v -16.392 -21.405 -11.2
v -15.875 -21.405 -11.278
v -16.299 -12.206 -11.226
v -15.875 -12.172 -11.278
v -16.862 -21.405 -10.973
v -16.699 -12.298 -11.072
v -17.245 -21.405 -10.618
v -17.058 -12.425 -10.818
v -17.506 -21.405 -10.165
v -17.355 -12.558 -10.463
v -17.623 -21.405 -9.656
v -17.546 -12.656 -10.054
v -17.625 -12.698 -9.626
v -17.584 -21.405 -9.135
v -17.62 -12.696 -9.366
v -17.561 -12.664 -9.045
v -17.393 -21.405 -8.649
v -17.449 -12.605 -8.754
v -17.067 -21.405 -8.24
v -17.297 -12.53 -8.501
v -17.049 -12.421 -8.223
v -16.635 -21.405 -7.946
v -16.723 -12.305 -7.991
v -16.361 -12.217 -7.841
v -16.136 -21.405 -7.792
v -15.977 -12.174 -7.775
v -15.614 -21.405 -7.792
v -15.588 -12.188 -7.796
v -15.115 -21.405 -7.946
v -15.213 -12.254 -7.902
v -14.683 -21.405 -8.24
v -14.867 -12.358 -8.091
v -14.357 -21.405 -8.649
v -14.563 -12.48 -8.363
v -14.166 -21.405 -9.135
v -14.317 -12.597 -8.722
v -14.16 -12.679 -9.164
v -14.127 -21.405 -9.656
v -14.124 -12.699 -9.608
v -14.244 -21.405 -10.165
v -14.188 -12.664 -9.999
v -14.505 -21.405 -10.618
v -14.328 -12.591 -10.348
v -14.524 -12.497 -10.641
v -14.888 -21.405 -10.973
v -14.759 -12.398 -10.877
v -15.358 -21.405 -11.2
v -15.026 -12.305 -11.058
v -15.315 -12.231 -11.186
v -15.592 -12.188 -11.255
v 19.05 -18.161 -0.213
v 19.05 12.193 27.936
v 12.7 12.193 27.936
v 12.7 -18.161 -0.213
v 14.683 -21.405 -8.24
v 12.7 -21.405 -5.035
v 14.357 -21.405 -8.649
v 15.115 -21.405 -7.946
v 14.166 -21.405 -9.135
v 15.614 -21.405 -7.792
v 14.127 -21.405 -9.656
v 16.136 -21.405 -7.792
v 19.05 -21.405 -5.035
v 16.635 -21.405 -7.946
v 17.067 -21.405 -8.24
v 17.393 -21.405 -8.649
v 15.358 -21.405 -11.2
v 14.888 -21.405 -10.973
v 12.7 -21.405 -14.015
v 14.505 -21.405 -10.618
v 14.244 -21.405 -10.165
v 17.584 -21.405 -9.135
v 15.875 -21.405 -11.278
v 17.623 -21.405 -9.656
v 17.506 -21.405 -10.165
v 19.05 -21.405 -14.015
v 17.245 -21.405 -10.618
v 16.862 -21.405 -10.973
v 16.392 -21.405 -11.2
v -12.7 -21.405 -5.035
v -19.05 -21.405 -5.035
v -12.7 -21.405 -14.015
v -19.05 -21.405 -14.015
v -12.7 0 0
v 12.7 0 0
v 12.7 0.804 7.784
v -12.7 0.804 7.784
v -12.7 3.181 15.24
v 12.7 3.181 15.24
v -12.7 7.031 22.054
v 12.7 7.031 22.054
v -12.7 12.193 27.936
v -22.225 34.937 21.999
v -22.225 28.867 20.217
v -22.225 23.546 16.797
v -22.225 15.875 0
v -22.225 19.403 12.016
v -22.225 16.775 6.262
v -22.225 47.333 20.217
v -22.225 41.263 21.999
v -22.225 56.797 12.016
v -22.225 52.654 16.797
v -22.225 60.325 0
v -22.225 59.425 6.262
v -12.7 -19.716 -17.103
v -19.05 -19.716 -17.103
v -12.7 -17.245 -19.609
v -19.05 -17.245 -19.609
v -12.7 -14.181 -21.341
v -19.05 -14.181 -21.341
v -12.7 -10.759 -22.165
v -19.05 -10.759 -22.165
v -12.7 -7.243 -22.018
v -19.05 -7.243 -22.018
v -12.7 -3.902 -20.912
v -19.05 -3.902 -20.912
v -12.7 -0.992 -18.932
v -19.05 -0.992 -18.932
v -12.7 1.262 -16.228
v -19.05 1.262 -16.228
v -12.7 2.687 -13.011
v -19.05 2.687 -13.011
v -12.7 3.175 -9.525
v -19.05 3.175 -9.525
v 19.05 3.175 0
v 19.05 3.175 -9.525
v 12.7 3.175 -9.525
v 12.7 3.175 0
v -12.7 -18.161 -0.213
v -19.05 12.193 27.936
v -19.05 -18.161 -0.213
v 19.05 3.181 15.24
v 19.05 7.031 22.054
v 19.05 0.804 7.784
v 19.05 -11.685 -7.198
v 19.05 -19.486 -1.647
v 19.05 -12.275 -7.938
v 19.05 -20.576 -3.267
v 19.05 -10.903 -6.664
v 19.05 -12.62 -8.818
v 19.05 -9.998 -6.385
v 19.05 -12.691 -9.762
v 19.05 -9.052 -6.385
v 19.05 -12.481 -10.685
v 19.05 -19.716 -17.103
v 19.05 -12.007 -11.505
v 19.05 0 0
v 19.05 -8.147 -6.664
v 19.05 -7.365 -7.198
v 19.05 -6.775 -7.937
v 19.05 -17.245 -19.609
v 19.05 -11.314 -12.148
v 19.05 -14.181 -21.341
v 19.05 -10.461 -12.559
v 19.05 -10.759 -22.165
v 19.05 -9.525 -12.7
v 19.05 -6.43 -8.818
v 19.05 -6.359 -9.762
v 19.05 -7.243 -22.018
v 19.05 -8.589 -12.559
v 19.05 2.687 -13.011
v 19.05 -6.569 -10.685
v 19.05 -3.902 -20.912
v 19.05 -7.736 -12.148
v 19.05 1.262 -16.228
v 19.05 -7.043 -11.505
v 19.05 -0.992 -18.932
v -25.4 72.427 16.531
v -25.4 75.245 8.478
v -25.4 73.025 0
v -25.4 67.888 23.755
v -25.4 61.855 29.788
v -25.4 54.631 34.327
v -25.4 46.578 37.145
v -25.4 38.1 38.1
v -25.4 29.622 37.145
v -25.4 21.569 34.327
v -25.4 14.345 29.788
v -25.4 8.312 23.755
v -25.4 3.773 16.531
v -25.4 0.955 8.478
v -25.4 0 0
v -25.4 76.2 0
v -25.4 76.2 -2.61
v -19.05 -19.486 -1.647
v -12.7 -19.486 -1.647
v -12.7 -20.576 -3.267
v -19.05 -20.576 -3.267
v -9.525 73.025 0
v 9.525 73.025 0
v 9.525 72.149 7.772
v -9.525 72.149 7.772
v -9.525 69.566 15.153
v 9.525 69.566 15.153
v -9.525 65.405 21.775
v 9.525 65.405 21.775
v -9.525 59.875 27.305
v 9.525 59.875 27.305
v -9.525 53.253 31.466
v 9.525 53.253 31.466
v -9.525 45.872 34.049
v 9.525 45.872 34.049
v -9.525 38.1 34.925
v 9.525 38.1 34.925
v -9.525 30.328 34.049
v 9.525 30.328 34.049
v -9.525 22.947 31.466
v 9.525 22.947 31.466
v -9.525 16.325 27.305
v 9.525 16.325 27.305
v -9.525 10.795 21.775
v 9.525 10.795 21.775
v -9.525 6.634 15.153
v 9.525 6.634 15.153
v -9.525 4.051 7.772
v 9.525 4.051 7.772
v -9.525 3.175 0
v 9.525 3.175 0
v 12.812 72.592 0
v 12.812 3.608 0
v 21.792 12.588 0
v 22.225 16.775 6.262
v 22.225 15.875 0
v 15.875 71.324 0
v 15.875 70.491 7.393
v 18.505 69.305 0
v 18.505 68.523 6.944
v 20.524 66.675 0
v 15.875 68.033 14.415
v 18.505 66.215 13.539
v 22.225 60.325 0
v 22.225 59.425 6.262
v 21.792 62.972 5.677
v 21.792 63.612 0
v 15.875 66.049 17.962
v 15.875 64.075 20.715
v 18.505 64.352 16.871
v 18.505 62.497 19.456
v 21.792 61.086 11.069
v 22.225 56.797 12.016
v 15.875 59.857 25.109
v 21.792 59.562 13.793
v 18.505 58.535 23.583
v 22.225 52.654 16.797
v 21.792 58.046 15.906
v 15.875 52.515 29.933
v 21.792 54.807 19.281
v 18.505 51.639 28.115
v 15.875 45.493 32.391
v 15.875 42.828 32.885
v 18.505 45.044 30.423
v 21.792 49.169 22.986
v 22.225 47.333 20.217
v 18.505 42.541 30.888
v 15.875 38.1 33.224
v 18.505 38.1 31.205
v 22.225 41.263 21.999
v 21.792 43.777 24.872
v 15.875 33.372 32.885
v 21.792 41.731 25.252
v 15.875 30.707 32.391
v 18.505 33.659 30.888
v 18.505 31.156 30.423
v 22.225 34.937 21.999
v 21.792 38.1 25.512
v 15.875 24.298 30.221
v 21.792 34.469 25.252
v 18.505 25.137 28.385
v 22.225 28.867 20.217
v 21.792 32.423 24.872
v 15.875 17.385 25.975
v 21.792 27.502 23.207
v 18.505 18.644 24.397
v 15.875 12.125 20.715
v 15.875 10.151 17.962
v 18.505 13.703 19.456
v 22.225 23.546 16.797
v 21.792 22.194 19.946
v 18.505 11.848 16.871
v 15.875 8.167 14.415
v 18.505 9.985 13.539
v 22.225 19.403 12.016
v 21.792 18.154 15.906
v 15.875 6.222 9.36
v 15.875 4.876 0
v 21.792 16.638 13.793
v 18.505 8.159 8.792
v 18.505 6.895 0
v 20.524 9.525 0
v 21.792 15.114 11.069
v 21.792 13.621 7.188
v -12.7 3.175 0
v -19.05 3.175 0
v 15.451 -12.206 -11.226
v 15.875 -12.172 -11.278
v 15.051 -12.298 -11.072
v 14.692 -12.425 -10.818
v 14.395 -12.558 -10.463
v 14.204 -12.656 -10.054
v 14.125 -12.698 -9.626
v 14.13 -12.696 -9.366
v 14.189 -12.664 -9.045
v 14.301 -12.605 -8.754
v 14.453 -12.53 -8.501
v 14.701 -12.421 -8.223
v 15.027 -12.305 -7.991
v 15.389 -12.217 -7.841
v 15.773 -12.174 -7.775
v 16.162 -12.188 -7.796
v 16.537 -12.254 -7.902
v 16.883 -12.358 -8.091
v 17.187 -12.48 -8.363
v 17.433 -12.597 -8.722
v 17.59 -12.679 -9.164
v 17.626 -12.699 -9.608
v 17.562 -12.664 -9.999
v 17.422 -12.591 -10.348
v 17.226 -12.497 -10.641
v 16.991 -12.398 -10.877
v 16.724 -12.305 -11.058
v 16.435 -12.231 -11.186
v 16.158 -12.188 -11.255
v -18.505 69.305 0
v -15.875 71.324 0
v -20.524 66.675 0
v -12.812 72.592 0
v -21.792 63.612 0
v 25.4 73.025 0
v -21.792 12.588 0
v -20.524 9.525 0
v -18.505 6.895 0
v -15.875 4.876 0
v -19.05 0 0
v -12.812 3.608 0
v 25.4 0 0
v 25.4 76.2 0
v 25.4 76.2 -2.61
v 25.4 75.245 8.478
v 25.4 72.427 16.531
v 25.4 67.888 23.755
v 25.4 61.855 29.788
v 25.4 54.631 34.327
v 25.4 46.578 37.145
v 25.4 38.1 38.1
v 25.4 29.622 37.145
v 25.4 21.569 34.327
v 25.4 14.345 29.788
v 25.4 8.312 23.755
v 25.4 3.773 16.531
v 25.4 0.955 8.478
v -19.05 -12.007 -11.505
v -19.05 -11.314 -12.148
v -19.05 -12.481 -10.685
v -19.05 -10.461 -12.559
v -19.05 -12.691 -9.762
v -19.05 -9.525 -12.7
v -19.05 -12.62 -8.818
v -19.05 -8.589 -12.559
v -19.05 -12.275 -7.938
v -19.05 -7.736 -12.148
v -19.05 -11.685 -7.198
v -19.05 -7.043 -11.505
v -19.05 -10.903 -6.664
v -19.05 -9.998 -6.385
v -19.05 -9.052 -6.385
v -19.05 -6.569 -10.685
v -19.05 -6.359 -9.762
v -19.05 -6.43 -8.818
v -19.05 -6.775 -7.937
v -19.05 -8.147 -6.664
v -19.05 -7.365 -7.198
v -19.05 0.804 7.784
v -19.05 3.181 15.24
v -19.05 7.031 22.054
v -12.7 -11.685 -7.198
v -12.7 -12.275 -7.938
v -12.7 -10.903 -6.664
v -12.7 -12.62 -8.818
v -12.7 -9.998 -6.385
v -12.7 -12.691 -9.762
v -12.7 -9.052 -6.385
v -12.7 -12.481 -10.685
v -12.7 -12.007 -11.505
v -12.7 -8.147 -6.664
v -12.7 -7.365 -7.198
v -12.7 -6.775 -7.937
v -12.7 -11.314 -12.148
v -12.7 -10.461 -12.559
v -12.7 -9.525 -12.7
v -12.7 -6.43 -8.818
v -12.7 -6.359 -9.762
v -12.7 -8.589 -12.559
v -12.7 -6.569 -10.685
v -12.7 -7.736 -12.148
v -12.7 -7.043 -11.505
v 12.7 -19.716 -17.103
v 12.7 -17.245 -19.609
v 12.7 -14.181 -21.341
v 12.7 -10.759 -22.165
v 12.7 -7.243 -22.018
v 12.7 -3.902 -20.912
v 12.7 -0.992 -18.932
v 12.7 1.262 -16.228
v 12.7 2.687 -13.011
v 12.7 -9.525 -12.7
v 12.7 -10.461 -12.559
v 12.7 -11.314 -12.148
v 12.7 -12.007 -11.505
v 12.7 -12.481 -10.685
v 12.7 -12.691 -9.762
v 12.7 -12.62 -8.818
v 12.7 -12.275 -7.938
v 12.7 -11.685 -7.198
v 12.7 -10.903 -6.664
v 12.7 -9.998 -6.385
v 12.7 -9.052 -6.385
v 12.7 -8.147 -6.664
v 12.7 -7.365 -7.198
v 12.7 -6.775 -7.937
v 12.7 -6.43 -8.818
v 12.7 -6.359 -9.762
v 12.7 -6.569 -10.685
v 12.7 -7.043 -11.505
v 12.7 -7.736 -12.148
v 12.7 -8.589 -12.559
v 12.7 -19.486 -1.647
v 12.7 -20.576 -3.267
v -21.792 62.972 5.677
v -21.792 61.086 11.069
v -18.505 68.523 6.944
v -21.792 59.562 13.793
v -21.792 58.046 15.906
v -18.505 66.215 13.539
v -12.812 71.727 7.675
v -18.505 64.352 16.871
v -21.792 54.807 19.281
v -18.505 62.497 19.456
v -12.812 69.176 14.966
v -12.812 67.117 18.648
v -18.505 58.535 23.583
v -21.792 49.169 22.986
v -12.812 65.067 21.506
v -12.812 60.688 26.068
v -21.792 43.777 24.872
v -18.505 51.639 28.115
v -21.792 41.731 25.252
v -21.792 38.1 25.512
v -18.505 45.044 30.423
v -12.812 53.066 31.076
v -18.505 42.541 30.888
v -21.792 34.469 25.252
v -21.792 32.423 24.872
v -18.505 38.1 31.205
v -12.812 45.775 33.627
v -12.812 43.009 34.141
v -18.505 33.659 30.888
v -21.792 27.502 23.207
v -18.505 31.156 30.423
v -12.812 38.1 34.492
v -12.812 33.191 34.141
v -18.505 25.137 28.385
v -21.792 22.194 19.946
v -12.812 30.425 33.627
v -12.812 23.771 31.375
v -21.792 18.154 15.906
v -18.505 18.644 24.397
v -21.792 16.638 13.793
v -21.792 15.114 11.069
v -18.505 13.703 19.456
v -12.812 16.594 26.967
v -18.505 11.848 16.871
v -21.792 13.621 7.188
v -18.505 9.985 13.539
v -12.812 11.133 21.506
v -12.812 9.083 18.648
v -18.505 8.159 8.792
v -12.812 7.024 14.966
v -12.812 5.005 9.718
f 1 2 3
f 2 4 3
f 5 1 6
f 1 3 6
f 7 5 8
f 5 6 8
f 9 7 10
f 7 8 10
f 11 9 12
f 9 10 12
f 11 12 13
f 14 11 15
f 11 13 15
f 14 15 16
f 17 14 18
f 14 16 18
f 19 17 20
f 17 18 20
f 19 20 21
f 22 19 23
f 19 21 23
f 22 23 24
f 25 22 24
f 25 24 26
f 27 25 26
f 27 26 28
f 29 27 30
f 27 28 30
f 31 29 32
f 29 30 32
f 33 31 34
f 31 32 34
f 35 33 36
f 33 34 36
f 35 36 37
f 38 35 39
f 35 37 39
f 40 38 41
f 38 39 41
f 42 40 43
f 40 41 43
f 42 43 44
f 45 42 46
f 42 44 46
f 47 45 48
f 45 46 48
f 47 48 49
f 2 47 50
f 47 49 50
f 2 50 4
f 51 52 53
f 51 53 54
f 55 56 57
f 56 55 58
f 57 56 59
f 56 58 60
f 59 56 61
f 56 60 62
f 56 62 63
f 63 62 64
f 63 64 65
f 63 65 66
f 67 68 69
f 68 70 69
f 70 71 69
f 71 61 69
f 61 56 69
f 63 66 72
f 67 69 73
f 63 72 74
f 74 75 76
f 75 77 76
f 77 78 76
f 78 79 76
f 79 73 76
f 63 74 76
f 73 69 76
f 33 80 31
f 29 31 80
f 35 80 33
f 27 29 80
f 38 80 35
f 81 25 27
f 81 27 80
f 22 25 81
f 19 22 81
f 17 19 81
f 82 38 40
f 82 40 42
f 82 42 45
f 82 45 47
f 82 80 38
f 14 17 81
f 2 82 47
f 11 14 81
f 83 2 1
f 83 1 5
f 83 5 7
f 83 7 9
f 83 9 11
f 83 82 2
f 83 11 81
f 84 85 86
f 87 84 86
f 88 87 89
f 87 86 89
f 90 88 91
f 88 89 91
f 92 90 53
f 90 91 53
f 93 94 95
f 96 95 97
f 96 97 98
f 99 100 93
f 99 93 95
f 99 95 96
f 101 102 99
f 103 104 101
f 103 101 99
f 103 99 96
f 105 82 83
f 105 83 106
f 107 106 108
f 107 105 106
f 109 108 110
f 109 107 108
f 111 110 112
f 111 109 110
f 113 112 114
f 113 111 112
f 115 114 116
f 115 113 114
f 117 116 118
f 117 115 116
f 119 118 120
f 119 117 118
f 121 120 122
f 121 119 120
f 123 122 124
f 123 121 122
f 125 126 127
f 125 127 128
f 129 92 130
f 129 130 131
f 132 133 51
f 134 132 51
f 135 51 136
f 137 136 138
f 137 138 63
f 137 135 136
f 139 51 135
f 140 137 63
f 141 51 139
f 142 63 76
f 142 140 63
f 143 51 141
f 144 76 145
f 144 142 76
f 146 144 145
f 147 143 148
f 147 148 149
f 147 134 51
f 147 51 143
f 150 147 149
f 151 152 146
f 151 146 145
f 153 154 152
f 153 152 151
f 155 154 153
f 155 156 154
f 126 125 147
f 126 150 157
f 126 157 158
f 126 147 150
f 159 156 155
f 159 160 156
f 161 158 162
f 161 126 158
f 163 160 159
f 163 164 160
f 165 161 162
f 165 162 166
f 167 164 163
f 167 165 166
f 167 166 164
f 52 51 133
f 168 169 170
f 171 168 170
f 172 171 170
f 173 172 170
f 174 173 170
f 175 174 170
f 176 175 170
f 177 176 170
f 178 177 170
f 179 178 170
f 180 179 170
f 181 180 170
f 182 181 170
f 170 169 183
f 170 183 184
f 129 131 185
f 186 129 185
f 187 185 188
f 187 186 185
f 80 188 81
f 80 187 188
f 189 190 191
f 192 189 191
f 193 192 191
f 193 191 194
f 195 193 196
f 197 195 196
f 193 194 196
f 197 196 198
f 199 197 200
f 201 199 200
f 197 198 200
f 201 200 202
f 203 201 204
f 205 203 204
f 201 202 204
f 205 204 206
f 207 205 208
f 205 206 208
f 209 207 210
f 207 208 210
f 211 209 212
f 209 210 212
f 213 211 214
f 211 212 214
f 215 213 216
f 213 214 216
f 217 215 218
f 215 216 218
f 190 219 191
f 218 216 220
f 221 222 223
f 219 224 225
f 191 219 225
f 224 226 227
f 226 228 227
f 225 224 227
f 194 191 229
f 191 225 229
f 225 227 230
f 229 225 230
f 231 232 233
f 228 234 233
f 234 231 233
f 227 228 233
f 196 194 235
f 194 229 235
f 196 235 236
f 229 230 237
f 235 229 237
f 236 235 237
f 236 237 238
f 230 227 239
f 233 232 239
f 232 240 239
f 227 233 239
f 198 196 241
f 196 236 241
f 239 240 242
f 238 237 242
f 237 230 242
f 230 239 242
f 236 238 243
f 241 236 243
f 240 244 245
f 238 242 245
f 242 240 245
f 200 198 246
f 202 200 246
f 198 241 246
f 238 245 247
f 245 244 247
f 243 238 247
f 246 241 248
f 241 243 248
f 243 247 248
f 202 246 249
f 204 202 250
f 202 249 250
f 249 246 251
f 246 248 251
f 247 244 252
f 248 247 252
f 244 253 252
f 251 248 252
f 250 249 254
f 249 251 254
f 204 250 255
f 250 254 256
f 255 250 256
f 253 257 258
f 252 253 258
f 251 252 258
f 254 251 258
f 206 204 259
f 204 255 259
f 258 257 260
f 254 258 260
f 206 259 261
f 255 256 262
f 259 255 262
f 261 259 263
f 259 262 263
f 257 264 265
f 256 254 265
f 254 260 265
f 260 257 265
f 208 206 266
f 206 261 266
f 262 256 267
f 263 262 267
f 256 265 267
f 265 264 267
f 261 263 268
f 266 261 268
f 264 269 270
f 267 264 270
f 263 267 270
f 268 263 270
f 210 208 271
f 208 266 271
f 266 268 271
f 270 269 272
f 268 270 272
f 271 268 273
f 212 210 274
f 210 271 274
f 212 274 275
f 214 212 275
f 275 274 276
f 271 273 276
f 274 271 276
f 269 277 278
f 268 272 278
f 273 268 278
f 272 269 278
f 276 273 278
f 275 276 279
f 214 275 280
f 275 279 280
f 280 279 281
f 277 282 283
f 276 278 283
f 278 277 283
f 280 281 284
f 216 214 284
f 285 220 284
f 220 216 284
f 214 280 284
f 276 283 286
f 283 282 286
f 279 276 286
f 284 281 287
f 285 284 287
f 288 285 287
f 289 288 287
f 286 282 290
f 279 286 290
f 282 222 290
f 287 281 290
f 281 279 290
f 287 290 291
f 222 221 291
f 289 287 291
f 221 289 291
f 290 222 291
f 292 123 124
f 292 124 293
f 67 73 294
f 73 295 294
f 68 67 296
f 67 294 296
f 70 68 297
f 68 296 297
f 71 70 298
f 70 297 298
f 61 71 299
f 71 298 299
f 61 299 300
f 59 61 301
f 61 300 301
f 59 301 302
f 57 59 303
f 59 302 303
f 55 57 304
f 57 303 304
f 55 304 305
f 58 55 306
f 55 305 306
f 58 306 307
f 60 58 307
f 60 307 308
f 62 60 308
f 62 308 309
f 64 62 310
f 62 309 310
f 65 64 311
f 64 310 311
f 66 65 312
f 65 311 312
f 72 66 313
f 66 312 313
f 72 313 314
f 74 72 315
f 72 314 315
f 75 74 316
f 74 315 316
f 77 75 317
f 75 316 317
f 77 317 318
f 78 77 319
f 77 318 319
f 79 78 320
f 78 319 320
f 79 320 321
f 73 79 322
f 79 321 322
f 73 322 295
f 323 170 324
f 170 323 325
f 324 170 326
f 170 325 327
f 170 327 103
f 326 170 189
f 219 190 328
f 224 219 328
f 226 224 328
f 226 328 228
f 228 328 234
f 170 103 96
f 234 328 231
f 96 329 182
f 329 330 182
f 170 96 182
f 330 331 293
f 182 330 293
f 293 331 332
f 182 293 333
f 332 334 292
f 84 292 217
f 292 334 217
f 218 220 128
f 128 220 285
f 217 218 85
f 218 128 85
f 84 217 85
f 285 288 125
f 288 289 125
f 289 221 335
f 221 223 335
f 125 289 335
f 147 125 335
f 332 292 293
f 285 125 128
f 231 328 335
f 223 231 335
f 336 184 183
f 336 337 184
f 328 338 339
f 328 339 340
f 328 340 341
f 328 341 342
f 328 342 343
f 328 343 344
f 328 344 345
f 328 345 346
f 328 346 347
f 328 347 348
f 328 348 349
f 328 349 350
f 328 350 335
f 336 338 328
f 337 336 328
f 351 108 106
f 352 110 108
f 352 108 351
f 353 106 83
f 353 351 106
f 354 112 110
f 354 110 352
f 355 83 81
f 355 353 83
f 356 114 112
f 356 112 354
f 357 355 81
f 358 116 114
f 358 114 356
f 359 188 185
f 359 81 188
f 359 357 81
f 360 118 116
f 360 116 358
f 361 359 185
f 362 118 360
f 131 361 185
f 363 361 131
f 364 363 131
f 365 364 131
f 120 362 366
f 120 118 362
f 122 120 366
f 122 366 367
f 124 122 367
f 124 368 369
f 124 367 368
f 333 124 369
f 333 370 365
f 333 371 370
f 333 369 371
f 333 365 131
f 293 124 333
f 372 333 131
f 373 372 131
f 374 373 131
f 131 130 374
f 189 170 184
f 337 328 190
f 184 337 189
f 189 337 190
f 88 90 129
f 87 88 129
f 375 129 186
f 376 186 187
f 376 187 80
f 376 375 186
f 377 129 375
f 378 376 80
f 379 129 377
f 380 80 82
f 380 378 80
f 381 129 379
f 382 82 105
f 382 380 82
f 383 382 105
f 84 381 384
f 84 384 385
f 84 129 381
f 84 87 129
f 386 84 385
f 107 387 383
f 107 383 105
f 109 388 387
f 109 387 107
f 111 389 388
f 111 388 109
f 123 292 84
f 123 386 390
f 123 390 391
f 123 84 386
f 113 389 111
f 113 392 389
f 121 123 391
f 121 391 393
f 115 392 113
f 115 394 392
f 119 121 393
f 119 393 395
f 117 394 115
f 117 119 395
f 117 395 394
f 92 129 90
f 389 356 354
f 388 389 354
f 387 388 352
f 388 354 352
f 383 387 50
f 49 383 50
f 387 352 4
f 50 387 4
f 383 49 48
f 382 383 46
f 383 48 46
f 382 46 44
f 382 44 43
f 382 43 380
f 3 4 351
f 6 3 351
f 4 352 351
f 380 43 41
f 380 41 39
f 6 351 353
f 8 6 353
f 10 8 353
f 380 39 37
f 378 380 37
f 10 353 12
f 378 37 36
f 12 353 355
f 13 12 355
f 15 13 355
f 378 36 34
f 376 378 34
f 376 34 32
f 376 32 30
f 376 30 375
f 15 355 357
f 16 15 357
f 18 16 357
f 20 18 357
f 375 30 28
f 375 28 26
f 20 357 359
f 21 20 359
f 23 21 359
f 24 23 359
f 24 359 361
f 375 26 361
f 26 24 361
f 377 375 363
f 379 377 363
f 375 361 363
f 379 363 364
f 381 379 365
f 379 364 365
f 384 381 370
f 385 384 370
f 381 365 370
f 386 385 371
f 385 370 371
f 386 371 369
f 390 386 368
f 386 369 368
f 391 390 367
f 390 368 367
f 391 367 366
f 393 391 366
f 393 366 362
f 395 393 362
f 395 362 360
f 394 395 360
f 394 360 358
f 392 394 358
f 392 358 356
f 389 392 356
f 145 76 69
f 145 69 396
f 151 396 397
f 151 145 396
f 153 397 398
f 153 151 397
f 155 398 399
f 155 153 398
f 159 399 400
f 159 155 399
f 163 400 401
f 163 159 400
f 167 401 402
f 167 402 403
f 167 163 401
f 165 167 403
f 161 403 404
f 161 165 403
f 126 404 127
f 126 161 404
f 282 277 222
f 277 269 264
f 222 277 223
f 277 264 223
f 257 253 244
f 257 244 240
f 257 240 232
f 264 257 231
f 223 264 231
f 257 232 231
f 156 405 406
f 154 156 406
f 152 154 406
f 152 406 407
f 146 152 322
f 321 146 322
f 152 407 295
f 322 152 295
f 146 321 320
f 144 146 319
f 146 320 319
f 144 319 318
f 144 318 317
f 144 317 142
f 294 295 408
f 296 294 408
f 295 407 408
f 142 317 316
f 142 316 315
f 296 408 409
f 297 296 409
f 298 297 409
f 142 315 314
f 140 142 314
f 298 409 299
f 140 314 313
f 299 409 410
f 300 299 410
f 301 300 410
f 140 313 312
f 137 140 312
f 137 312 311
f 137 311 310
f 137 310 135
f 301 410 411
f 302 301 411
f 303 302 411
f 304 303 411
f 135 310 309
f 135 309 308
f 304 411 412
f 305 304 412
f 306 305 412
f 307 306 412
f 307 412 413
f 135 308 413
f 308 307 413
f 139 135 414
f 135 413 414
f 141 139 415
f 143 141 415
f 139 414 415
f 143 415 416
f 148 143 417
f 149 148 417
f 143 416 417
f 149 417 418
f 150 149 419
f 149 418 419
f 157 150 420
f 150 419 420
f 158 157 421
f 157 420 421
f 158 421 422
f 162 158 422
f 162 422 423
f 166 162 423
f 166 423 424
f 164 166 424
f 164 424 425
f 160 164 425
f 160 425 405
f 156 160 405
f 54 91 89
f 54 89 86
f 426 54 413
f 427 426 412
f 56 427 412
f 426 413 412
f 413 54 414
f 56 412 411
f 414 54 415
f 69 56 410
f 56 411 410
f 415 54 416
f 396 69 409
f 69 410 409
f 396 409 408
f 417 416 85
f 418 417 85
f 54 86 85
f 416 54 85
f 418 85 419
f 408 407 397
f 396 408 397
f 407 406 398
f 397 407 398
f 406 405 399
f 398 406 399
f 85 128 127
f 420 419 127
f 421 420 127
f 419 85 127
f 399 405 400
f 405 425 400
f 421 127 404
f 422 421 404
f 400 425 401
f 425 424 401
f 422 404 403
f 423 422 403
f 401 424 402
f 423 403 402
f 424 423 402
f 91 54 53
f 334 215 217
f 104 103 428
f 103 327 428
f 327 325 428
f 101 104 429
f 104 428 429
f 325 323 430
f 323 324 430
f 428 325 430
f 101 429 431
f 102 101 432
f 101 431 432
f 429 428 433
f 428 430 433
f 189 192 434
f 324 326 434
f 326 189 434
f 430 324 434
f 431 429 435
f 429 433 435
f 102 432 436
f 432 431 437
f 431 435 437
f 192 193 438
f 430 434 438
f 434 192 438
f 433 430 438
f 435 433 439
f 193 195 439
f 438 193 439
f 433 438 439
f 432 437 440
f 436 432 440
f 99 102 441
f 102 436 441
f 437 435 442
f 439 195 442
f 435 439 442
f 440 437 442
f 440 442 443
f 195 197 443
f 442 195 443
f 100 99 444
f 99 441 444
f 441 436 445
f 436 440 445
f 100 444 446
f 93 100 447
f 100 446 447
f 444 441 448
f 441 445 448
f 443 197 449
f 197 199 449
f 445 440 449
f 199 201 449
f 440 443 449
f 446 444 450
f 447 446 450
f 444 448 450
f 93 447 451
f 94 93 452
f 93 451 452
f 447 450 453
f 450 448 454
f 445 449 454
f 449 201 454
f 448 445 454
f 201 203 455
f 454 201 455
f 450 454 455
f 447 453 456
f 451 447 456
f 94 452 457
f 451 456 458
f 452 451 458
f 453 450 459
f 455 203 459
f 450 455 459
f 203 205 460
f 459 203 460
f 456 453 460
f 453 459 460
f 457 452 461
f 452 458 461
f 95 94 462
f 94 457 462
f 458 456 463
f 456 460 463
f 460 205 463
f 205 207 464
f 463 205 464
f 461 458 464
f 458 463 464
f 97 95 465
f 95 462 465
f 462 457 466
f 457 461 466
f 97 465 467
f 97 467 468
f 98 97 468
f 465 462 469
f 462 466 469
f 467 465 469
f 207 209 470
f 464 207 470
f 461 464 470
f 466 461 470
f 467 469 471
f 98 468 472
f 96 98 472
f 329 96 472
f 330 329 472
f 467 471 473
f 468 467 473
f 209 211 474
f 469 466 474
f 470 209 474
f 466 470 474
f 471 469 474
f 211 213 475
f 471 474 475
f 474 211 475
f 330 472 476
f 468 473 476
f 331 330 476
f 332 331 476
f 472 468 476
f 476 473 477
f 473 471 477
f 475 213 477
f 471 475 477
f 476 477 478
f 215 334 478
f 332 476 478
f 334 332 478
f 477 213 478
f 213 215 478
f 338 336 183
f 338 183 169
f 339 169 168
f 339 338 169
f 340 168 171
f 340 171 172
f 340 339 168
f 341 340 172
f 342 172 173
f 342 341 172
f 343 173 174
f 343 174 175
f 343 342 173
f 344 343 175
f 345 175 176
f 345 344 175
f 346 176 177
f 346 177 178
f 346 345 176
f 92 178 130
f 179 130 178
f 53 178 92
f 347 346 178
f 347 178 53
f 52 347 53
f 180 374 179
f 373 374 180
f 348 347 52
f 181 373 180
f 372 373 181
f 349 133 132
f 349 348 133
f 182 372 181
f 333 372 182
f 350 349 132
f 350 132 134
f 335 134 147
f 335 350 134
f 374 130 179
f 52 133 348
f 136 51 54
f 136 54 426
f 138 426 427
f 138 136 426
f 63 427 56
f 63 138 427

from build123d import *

# Parameters (mm, degrees)
BOSS_EXTRUDE1_DEPTH                 = 25.4
SHELL1_T                            = -3.175
SKETCH4_R                           = 12.7
BOSS_EXTRUDE3_DEPTH                 = 19.05
BOSS_EXTRUDE4_DEPTH                 = 19.05
SKETCH6_R                           = 12.7
CUT_EXTRUDE2_DEPTH                  = 12.7
CUT_EXTRUDE3_START                  = 12.7
SKETCH6_2_R                         = 12.7
CUT_EXTRUDE3_DEPTH                  = 12.7
CUT_EXTRUDE4_REACH                  = 98.093
SKETCH7_R                           = 3.175
BOSS_EXTRUDE5_REACH                 = 98.093
CUT_EXTRUDE5_DEPTH                  = 12.7
BOSS_EXTRUDE6_DEPTH                 = 25.4
FILLET2_R                           = 12.7
CUT_EXTRUDE6_REACH                  = 109.812
CUT_EXTRUDE6_END_RADIUS             = 3.175
SKETCH12_R                          = 1.7526
CUT_EXTRUDE6_DIRECTION_2_REACH      = 109.812
CUT_EXTRUDE6_DIRECTION_2_END_RADIUS = 12.7
CUT_EXTRUDE7_DEPTH                  = 108.812149615


with BuildPart() as part:
    # Sketch2 → Boss-Extrude1 (new, symmetric)
    with BuildSketch(Plane(origin=(0, 0, 0), x_dir=(0, 0, -1), z_dir=(1, 0, 0))):
        with BuildLine():
            Line((0, 0), (0, 76.2))
            ThreePointArc((0, 76.2), (-38.1, 38.1), (0, 0))
        make_face()
    extrude(amount=BOSS_EXTRUDE1_DEPTH, both=True)

    # Shell1
    shell1_openings = [part.faces().sort_by_distance(p)[0] for p in [
        (0, 38.1, 0),
    ]]
    offset(amount=SHELL1_T, openings=shell1_openings)



with BuildPart() as body_2:
    # Sketch4 → Boss-Extrude3 (new, symmetric)
    with BuildSketch(Plane(origin=(0, 0, 0), x_dir=(0, 0, -1), z_dir=(1, 0, 0))):
        with Locations(Location((9.525, -9.525, 0), (0, 0, 180))):
            Circle(SKETCH4_R)
    extrude(amount=BOSS_EXTRUDE3_DEPTH, both=True)


with BuildPart() as part_1:
    add(part.part)

    add(body_2.part)  # Boss-Extrude4 merges body 2
    # Sketch5 → Boss-Extrude4 (add, symmetric)
    with BuildSketch(Plane(origin=(0, 0, 0), x_dir=(0, 0, -1), z_dir=(1, 0, 0))):
        with BuildLine():
            Line((0, 3.175), (0, 0))
            Line((0, 0), (1.124739587, 0))
            ThreePointArc((1.124739587, 0), (5.034871939, 2.354762203), (9.525, 3.175))
            Line((9.525, 3.175), (0, 3.175))
        make_face()
    extrude(amount=BOSS_EXTRUDE4_DEPTH, both=True)

    # Sketch6 → Cut-Extrude2 (cut)
    with BuildSketch(Plane(origin=(0, 0, 0), x_dir=(0, 0, -1), z_dir=(1, 0, 0))):
        with Locations((9.525, -9.525)):
            Circle(SKETCH6_R)
    extrude(amount=-CUT_EXTRUDE2_DEPTH, mode=Mode.SUBTRACT)

    # Sketch6<2> → Cut-Extrude3 (cut)
    with BuildSketch(Plane(origin=(0, 0, 0), x_dir=(0, 0, -1), z_dir=(1, 0, 0)).offset(CUT_EXTRUDE3_START)):
        with Locations((9.525, -9.525)):
            Circle(SKETCH6_2_R)
    extrude(amount=-CUT_EXTRUDE3_DEPTH, mode=Mode.SUBTRACT)

    # Cut-Extrude4: up to this face of the body (flat: up to its plane)
    cut_extrude4_end = Plane(part_1.part.faces().sort_by_distance((25.4, 38.1, 16.170142218))[0])
    # Sketch7 → Cut-Extrude4 (cut, up to the picked face)
    with BuildSketch(Plane.ZY.offset(19.05), mode=Mode.PRIVATE) as cut_extrude4_sk1:
        with Locations(Location((-9.525, -9.525, 0), (0, 0, 180))):
            Circle(SKETCH7_R)
    cut_extrude4_tool1 = split(extrude(cut_extrude4_sk1.sketch, amount=-CUT_EXTRUDE4_REACH, mode=Mode.PRIVATE), bisect_by=cut_extrude4_end, keep=Keep.BOTH, mode=Mode.PRIVATE)
    add(cut_extrude4_tool1.solids().sort_by(Axis((-19.05, -9.525, -9.525), (1, 0, 0)))[0], mode=Mode.SUBTRACT)

    # Boss-Extrude5: up to this face of the body (flat: up to its plane)
    boss_extrude5_end = Plane(part_1.part.faces().sort_by_distance((-19.05, 2.815789755, -4.7625))[0])
    # Sketch8 → Boss-Extrude5 (add, up to the picked face)
    with BuildSketch(Plane(origin=(19.05, 0, 0), x_dir=(0, 0, -1), z_dir=(1, 0, 0)), mode=Mode.PRIVATE) as boss_extrude5_sk1:
        with BuildLine():
            Line((-27.936104056, 12.192779189), (0.212965315, -18.16074027))
            Line((0.212965315, -18.16074027), (5.034871939, -21.404762203))
            Line((5.034871939, -21.404762203), (1.124739587, 0))
            Line((1.124739587, 0), (0, 3.175))
            ThreePointArc((0, 3.175), (-13.704863106, 5.9762961), (-25.211222013, 13.9308066))
            Line((-25.211222013, 13.9308066), (-27.936104056, 12.192779189))
        make_face()
    boss_extrude5_tool1 = split(extrude(boss_extrude5_sk1.sketch, amount=-BOSS_EXTRUDE5_REACH, mode=Mode.PRIVATE), bisect_by=boss_extrude5_end, keep=Keep.BOTH, mode=Mode.PRIVATE)
    add(boss_extrude5_tool1.solids().sort_by(Axis((19.05, -2.840531, 7.724646), (-1, 0, 0)))[0])

    # Sketch9 → Cut-Extrude5 (cut, symmetric)
    with BuildSketch(Plane(origin=(0, 0, 0), x_dir=(0, 0, -1), z_dir=(1, 0, 0))):
        with BuildLine():
            Line((0, 3.175), (0, 0))
            ThreePointArc((0, 0), (-15.240486985, 3.180985746), (-27.936104056, 12.192779189))
            Line((-27.936104056, 12.192779189), (0.212965315, -18.16074027))
            ThreePointArc((0.212965315, -18.16074027), (21.164671418, -14.605162328), (9.525, 3.175))
            Line((9.525, 3.175), (0, 3.175))
        make_face()
    extrude(amount=CUT_EXTRUDE5_DEPTH, both=True, mode=Mode.SUBTRACT)

    # Sketch11 → Boss-Extrude6 (add, symmetric)
    with BuildSketch(Plane(origin=(0, 0, 0), x_dir=(0, 0, -1), z_dir=(1, 0, 0))):
        Polygon((2.609832197, 76.2), (0, 76.2), (0, 73.025), align=None)
    extrude(amount=BOSS_EXTRUDE6_DEPTH, both=True)

    # Fillet2
    # the kernel refuses this fillet: 12.7 mm, written as the material it adds along each edge
    with BuildSketch(Plane(origin=(-22.225, 38.1, 0), x_dir=(0, 1, 0), z_dir=(0, 0, -1))) as fillet2_piece_1:
        with BuildLine():
            CenterArc((34.925 - FILLET2_R, FILLET2_R), FILLET2_R, 270, 90)
            Line((34.925 - FILLET2_R, 0), (34.925, 0))
            Line((34.925, 0), (34.925, FILLET2_R))
        make_face()
    revolve(axis=Axis((-22.225, 38.1, 0), (1, 0, 0)), revolution_arc=180)
    with BuildSketch(Plane(origin=(22.225, 38.1, 0), x_dir=(0, 1, 0), z_dir=(0, 0, -1))) as fillet2_piece_2:
        with BuildLine():
            CenterArc((34.925 - FILLET2_R, -FILLET2_R), FILLET2_R, 0, 90)
            Line((34.925 - FILLET2_R, 0), (34.925, 0))
            Line((34.925, 0), (34.925, -FILLET2_R))
        make_face()
    revolve(axis=Axis((22.225, 38.1, 0), (1, 0, 0)), revolution_arc=180)

    # Cut-Extrude6: up to this cylinder (the profile starts outside it)
    cut_extrude6_end = Plane(origin=(0, -9.525, -9.525), z_dir=(-1, 0, 0)) * Cylinder(CUT_EXTRUDE6_END_RADIUS, 258.724, mode=Mode.PRIVATE)
    # Sketch12 → Cut-Extrude6 (cut, up to the surface)
    with BuildSketch(Plane(origin=(0, -21.404762203, 0), x_dir=(1, 0, 0), z_dir=(0, 1, 0)), mode=Mode.PRIVATE) as cut_extrude6_sk1:
        with Locations(Location((15.875, 9.525, 0), (0, 0, 90))):
            Circle(SKETCH12_R)
    cut_extrude6_tool1 = extrude(cut_extrude6_sk1.sketch, amount=CUT_EXTRUDE6_REACH, mode=Mode.PRIVATE) - cut_extrude6_end
    add(cut_extrude6_tool1.solids().sort_by_distance((15.875, -21.404762, -9.525))[0], mode=Mode.SUBTRACT)
    # Sketch12 → Cut-Extrude6 (cut, up to the surface)
    with BuildSketch(Plane(origin=(0, -21.404762203, 0), x_dir=(1, 0, 0), z_dir=(0, 1, 0)), mode=Mode.PRIVATE) as cut_extrude6_sk2:
        with Locations(Location((-15.875, 9.525, 0), (0, 0, 90))):
            Circle(SKETCH12_R)
    cut_extrude6_tool2 = extrude(cut_extrude6_sk2.sketch, amount=CUT_EXTRUDE6_REACH, mode=Mode.PRIVATE) - cut_extrude6_end
    add(cut_extrude6_tool2.solids().sort_by_distance((-15.875, -21.404762, -9.525))[0], mode=Mode.SUBTRACT)

    # Cut-Extrude6 direction 2: up to this cylinder (the profile starts inside it)
    cut_extrude6_direction_2_end = Plane(origin=(0, -9.525, -9.525), z_dir=(-1, 0, 0)) * Cylinder(CUT_EXTRUDE6_DIRECTION_2_END_RADIUS, 277.774, mode=Mode.PRIVATE)
    # Sketch12 → Cut-Extrude6 direction 2 (cut, up to the surface)
    with BuildSketch(Plane(origin=(0, -21.404762203, 0), x_dir=(1, 0, 0), z_dir=(0, 1, 0)), mode=Mode.PRIVATE) as cut_extrude6_direction_2_sk1:
        with Locations(Location((15.875, 9.525, 0), (0, 0, 90))):
            Circle(SKETCH12_R)
    cut_extrude6_direction_2_tool1 = extrude(cut_extrude6_direction_2_sk1.sketch, amount=-CUT_EXTRUDE6_DIRECTION_2_REACH, mode=Mode.PRIVATE) & cut_extrude6_direction_2_end
    add(cut_extrude6_direction_2_tool1.solids().sort_by_distance((15.875, -21.404762, -9.525))[0], mode=Mode.SUBTRACT)
    # Sketch12 → Cut-Extrude6 direction 2 (cut, up to the surface)
    with BuildSketch(Plane(origin=(0, -21.404762203, 0), x_dir=(1, 0, 0), z_dir=(0, 1, 0)), mode=Mode.PRIVATE) as cut_extrude6_direction_2_sk2:
        with Locations(Location((-15.875, 9.525, 0), (0, 0, 90))):
            Circle(SKETCH12_R)
    cut_extrude6_direction_2_tool2 = extrude(cut_extrude6_direction_2_sk2.sketch, amount=-CUT_EXTRUDE6_DIRECTION_2_REACH, mode=Mode.PRIVATE) & cut_extrude6_direction_2_end
    add(cut_extrude6_direction_2_tool2.solids().sort_by_distance((-15.875, -21.404762, -9.525))[0], mode=Mode.SUBTRACT)

    # Sketch13 → Cut-Extrude7 (cut, through all)
    with BuildSketch(Plane(origin=(0, -21.404762203, 0), x_dir=(1, 0, 0), z_dir=(0, 1, 0))):
        Polygon((19.05, 15.875), (12.7, 15.875), (12.7, 10.397684257), (12.7, 3.175), (19.05, 3.175), align=None)
        Polygon((-19.05, 15.875), (-12.7, 15.875), (-12.7, 10.397684257), (-12.7, 3.175), (-19.05, 3.175), align=None)
    extrude(amount=-CUT_EXTRUDE7_DEPTH, mode=Mode.SUBTRACT)


solid = part_1.part
